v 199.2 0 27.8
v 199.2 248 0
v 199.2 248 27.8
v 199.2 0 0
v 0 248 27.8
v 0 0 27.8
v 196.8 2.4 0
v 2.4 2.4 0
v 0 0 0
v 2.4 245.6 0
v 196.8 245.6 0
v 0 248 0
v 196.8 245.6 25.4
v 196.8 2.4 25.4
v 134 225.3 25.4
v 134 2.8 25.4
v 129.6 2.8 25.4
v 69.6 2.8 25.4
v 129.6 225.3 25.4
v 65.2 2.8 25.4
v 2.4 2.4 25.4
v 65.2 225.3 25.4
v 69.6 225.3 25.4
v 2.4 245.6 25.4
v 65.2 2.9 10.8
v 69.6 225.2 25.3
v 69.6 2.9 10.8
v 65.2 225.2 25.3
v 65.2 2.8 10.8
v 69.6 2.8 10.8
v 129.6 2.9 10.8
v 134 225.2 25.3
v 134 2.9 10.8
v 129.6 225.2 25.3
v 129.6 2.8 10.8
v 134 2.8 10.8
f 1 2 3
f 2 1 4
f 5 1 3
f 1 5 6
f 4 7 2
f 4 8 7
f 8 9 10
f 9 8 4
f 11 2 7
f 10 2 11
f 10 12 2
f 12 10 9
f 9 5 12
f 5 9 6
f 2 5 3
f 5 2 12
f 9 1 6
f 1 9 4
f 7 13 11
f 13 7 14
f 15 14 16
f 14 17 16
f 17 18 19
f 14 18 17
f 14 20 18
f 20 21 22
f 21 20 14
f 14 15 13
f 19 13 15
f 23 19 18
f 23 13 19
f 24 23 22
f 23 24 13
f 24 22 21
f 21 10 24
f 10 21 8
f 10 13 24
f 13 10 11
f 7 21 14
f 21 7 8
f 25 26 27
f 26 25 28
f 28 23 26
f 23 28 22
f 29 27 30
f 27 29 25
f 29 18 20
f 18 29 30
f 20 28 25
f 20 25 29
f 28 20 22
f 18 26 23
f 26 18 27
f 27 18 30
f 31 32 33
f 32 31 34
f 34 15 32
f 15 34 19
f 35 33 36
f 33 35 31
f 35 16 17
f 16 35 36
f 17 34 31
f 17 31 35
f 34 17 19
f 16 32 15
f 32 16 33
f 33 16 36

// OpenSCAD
// file: bookmark_display.scad
// Bookmark Display - Parametric Tray with Flat Storage
// Features slanted display slots and a long frontal tray for extras to lie flat.

/* [Bookmark Dimensions] */
// Width of each slot (fits bookmarks up to 56mm with clearance)
bookmark_width = 60;
// Maximum height of your bookmarks (used for tray depth)
bookmark_height = 220;
// Thickness of the bookmark (plus a little wiggle room)
bookmark_thickness = 1.6;
// Number of categories/slots side-by-side
number_of_slots = 3; // Reduced default to fit standard 3D print beds

/* [Display Configuration] */
// Gap between categories
slot_spacing = 2;
// Degrees to lean the display bookmark back
tilt_angle = 15;

/* [Storage Bin Settings] */
// Storage tray depth matches bookmark height
storage_depth = bookmark_height;
// Height of the front retaining wall for storage
storage_wall_h = 8;

/* [Structural Settings] */
// Thickness of the wall/floor
wall_thickness = 2.4;
// Depth of the rear block holding the display bookmark
display_block_depth = 20;
// Height of the display block
display_height = 25;

/* [Internal Calculations] */
// Width of internal separator walls (absorbs slot_spacing so storage bins = bookmark_width)
separator_width = wall_thickness + slot_spacing;
// Pitch per slot: bookmark width + one separator
slot_pitch = bookmark_width + separator_width;
total_width = (2 * wall_thickness) + (number_of_slots * bookmark_width) + ( (number_of_slots - 1) * separator_width);
total_depth = display_block_depth + storage_depth + wall_thickness;

module slot_cutout(w, t, h) {
  translate([0, 0, -1])
    cube([w, t, h + 2]);
}

module side_wall(w = wall_thickness) {
  // Elegant sloped side wall using hull to avoid subtractive holes
  hull() {
    // Front pillar
    cube([w, wall_thickness, storage_wall_h + wall_thickness]);
    // Back pillar
    translate([0, total_depth - display_block_depth, 0])
      cube([w, display_block_depth, display_height]);
  }
}

module main_fixture() {
  union() {
    // 1. The rear display block (solid)
    difference() {
      translate([0, total_depth - display_block_depth, 0])
        cube([total_width, display_block_depth, display_height]);

      // Display Slots
      for (i = [0:number_of_slots - 1]) {
        x_pos = wall_thickness + i * slot_pitch;
        y_pos = (display_block_depth / 2);

        translate([x_pos, total_depth - display_block_depth + y_pos, wall_thickness * 2])
          rotate([-tilt_angle, 0, 0])
            slot_cutout(bookmark_width, bookmark_thickness, 210);
      }
    }

    // 2. The front storage floor
    cube([total_width, total_depth - display_block_depth, wall_thickness]);

    // 3. Front retaining wall
    cube([total_width, wall_thickness, storage_wall_h + wall_thickness]);

    // 4. Solid Side Walls (Left and Right)
    side_wall();
    translate([total_width - wall_thickness, 0, 0])
      side_wall();

    // 5. Internal separators (if multiple slots)
    if (number_of_slots > 1) {
      for (i = [1:number_of_slots - 1]) {
        // Place the thick separator wall right after the previous slot
        sep_x = wall_thickness + (i - 1) * slot_pitch + bookmark_width;

        translate([sep_x, 0, 0])
          side_wall(separator_width);
      }
    }
  }
}

module main() {
  main_fixture();
}

// Include guard: only render when this is the top-level file
if (is_undef(__BOOKMARK_LID__)) {
  main();

  // Verification Echoes for 3D Printing
  echo(str("Total Width: ", total_width, "mm"));
  echo(str("Total Depth: ", total_depth, "mm"));
  echo(str("Max Height: ", display_height, "mm"));

  // Warning if dimensions exceed standard print beds
  if (total_width > 220 || total_depth > 220) {
    echo("WARNING: Stand dimensions may exceed standard 220x220mm print beds.");
  }
}
// main file
// Include guard: prevents the box from rendering when we include its parameters
__BOOKMARK_LID__ = true;
include <bookmark_display.scad>

/* [Lid Settings] */
// Gap between lid inner walls and box outer walls (print tolerance)
lid_clearance = 0.4;

/* [Derived Box Dimensions for Lid] */
box_front_h = storage_wall_h + wall_thickness;

/* [Lid Calculations] */
lid_outer_width = total_width + 2 * (wall_thickness + lid_clearance);
lid_outer_depth = total_depth + 2 * (wall_thickness + lid_clearance);
// Ceiling height is display_height + clearance. Total lid height adds wall_thickness on top.
lid_ceiling_z = display_height + lid_clearance;
lid_height = lid_ceiling_z + wall_thickness;

module lid_divider(w, d, h_front, h_rear, block_d) {
  // Internal divider that fills the space above the sloped box walls
  // Top is flat at lid_ceiling_z. Bottom is sloped to match the box.
  ceiling = lid_ceiling_z;

  // We use hull to create the sloped volume that fills the gap
  hull() {
    // Front pillar (thin slice at the front wall)
    translate([0, 0, h_front])
      cube([w, 0.1, ceiling - h_front]);

    // Transition point (where the display block starts)
    // At this point the box wall reaches display_height, so gap is zero (+clearance)
    translate([0, d - block_d, h_rear])
      cube([w, 0.1, 0.1]);

    // Keep the top flat across the whole span
    translate([0, 0, ceiling - 0.1])
      cube([w, d - block_d, 0.1]);
  }
}

module lid() {
  // Center the lid coordinate system so the box origin [0,0,0] 
  // is at [wall_thickness + lid_clearance, wall_thickness + lid_clearance, 0]
  box_offset_x = wall_thickness + lid_clearance;
  box_offset_y = wall_thickness + lid_clearance;

  union() {
    // 1. Outer Shell
    difference() {
      cube([lid_outer_width, lid_outer_depth, lid_height]);

      // Hollow out the main cavity
      translate([wall_thickness, wall_thickness, -1])
        cube(
          [
            lid_outer_width - 2 * wall_thickness,
            lid_outer_depth - 2 * wall_thickness,
            lid_ceiling_z + 1,
          ]
        );
    }

    // 2. Internal Dividers
    if (number_of_slots > 1) {
      for (i = [1:number_of_slots - 1]) {
        // Determine x-position of the box separator
        box_sep_x = wall_thickness + (i - 1) * slot_pitch + bookmark_width;

        // Lid divider width set to exactly match box separator width
        div_w = separator_width;

        translate([box_offset_x + box_sep_x, box_offset_y, 0])
          lid_divider(
            w=div_w,
            d=total_depth,
            h_front=box_front_h + lid_clearance,
            h_rear=display_height + lid_clearance,
            block_d=display_block_depth
          );
      }
    }
  }
}

// Render the lid
lid();

// Verification Echoes
echo(str("Lid Outer Width: ", lid_outer_width, "mm"));
echo(str("Lid Outer Depth: ", lid_outer_depth, "mm"));
echo(str("Lid Total Height: ", lid_height, "mm"));
echo(str("Box Front Height: ", box_front_h, "mm"));
echo(str("Box Max Height: ", display_height, "mm"));
